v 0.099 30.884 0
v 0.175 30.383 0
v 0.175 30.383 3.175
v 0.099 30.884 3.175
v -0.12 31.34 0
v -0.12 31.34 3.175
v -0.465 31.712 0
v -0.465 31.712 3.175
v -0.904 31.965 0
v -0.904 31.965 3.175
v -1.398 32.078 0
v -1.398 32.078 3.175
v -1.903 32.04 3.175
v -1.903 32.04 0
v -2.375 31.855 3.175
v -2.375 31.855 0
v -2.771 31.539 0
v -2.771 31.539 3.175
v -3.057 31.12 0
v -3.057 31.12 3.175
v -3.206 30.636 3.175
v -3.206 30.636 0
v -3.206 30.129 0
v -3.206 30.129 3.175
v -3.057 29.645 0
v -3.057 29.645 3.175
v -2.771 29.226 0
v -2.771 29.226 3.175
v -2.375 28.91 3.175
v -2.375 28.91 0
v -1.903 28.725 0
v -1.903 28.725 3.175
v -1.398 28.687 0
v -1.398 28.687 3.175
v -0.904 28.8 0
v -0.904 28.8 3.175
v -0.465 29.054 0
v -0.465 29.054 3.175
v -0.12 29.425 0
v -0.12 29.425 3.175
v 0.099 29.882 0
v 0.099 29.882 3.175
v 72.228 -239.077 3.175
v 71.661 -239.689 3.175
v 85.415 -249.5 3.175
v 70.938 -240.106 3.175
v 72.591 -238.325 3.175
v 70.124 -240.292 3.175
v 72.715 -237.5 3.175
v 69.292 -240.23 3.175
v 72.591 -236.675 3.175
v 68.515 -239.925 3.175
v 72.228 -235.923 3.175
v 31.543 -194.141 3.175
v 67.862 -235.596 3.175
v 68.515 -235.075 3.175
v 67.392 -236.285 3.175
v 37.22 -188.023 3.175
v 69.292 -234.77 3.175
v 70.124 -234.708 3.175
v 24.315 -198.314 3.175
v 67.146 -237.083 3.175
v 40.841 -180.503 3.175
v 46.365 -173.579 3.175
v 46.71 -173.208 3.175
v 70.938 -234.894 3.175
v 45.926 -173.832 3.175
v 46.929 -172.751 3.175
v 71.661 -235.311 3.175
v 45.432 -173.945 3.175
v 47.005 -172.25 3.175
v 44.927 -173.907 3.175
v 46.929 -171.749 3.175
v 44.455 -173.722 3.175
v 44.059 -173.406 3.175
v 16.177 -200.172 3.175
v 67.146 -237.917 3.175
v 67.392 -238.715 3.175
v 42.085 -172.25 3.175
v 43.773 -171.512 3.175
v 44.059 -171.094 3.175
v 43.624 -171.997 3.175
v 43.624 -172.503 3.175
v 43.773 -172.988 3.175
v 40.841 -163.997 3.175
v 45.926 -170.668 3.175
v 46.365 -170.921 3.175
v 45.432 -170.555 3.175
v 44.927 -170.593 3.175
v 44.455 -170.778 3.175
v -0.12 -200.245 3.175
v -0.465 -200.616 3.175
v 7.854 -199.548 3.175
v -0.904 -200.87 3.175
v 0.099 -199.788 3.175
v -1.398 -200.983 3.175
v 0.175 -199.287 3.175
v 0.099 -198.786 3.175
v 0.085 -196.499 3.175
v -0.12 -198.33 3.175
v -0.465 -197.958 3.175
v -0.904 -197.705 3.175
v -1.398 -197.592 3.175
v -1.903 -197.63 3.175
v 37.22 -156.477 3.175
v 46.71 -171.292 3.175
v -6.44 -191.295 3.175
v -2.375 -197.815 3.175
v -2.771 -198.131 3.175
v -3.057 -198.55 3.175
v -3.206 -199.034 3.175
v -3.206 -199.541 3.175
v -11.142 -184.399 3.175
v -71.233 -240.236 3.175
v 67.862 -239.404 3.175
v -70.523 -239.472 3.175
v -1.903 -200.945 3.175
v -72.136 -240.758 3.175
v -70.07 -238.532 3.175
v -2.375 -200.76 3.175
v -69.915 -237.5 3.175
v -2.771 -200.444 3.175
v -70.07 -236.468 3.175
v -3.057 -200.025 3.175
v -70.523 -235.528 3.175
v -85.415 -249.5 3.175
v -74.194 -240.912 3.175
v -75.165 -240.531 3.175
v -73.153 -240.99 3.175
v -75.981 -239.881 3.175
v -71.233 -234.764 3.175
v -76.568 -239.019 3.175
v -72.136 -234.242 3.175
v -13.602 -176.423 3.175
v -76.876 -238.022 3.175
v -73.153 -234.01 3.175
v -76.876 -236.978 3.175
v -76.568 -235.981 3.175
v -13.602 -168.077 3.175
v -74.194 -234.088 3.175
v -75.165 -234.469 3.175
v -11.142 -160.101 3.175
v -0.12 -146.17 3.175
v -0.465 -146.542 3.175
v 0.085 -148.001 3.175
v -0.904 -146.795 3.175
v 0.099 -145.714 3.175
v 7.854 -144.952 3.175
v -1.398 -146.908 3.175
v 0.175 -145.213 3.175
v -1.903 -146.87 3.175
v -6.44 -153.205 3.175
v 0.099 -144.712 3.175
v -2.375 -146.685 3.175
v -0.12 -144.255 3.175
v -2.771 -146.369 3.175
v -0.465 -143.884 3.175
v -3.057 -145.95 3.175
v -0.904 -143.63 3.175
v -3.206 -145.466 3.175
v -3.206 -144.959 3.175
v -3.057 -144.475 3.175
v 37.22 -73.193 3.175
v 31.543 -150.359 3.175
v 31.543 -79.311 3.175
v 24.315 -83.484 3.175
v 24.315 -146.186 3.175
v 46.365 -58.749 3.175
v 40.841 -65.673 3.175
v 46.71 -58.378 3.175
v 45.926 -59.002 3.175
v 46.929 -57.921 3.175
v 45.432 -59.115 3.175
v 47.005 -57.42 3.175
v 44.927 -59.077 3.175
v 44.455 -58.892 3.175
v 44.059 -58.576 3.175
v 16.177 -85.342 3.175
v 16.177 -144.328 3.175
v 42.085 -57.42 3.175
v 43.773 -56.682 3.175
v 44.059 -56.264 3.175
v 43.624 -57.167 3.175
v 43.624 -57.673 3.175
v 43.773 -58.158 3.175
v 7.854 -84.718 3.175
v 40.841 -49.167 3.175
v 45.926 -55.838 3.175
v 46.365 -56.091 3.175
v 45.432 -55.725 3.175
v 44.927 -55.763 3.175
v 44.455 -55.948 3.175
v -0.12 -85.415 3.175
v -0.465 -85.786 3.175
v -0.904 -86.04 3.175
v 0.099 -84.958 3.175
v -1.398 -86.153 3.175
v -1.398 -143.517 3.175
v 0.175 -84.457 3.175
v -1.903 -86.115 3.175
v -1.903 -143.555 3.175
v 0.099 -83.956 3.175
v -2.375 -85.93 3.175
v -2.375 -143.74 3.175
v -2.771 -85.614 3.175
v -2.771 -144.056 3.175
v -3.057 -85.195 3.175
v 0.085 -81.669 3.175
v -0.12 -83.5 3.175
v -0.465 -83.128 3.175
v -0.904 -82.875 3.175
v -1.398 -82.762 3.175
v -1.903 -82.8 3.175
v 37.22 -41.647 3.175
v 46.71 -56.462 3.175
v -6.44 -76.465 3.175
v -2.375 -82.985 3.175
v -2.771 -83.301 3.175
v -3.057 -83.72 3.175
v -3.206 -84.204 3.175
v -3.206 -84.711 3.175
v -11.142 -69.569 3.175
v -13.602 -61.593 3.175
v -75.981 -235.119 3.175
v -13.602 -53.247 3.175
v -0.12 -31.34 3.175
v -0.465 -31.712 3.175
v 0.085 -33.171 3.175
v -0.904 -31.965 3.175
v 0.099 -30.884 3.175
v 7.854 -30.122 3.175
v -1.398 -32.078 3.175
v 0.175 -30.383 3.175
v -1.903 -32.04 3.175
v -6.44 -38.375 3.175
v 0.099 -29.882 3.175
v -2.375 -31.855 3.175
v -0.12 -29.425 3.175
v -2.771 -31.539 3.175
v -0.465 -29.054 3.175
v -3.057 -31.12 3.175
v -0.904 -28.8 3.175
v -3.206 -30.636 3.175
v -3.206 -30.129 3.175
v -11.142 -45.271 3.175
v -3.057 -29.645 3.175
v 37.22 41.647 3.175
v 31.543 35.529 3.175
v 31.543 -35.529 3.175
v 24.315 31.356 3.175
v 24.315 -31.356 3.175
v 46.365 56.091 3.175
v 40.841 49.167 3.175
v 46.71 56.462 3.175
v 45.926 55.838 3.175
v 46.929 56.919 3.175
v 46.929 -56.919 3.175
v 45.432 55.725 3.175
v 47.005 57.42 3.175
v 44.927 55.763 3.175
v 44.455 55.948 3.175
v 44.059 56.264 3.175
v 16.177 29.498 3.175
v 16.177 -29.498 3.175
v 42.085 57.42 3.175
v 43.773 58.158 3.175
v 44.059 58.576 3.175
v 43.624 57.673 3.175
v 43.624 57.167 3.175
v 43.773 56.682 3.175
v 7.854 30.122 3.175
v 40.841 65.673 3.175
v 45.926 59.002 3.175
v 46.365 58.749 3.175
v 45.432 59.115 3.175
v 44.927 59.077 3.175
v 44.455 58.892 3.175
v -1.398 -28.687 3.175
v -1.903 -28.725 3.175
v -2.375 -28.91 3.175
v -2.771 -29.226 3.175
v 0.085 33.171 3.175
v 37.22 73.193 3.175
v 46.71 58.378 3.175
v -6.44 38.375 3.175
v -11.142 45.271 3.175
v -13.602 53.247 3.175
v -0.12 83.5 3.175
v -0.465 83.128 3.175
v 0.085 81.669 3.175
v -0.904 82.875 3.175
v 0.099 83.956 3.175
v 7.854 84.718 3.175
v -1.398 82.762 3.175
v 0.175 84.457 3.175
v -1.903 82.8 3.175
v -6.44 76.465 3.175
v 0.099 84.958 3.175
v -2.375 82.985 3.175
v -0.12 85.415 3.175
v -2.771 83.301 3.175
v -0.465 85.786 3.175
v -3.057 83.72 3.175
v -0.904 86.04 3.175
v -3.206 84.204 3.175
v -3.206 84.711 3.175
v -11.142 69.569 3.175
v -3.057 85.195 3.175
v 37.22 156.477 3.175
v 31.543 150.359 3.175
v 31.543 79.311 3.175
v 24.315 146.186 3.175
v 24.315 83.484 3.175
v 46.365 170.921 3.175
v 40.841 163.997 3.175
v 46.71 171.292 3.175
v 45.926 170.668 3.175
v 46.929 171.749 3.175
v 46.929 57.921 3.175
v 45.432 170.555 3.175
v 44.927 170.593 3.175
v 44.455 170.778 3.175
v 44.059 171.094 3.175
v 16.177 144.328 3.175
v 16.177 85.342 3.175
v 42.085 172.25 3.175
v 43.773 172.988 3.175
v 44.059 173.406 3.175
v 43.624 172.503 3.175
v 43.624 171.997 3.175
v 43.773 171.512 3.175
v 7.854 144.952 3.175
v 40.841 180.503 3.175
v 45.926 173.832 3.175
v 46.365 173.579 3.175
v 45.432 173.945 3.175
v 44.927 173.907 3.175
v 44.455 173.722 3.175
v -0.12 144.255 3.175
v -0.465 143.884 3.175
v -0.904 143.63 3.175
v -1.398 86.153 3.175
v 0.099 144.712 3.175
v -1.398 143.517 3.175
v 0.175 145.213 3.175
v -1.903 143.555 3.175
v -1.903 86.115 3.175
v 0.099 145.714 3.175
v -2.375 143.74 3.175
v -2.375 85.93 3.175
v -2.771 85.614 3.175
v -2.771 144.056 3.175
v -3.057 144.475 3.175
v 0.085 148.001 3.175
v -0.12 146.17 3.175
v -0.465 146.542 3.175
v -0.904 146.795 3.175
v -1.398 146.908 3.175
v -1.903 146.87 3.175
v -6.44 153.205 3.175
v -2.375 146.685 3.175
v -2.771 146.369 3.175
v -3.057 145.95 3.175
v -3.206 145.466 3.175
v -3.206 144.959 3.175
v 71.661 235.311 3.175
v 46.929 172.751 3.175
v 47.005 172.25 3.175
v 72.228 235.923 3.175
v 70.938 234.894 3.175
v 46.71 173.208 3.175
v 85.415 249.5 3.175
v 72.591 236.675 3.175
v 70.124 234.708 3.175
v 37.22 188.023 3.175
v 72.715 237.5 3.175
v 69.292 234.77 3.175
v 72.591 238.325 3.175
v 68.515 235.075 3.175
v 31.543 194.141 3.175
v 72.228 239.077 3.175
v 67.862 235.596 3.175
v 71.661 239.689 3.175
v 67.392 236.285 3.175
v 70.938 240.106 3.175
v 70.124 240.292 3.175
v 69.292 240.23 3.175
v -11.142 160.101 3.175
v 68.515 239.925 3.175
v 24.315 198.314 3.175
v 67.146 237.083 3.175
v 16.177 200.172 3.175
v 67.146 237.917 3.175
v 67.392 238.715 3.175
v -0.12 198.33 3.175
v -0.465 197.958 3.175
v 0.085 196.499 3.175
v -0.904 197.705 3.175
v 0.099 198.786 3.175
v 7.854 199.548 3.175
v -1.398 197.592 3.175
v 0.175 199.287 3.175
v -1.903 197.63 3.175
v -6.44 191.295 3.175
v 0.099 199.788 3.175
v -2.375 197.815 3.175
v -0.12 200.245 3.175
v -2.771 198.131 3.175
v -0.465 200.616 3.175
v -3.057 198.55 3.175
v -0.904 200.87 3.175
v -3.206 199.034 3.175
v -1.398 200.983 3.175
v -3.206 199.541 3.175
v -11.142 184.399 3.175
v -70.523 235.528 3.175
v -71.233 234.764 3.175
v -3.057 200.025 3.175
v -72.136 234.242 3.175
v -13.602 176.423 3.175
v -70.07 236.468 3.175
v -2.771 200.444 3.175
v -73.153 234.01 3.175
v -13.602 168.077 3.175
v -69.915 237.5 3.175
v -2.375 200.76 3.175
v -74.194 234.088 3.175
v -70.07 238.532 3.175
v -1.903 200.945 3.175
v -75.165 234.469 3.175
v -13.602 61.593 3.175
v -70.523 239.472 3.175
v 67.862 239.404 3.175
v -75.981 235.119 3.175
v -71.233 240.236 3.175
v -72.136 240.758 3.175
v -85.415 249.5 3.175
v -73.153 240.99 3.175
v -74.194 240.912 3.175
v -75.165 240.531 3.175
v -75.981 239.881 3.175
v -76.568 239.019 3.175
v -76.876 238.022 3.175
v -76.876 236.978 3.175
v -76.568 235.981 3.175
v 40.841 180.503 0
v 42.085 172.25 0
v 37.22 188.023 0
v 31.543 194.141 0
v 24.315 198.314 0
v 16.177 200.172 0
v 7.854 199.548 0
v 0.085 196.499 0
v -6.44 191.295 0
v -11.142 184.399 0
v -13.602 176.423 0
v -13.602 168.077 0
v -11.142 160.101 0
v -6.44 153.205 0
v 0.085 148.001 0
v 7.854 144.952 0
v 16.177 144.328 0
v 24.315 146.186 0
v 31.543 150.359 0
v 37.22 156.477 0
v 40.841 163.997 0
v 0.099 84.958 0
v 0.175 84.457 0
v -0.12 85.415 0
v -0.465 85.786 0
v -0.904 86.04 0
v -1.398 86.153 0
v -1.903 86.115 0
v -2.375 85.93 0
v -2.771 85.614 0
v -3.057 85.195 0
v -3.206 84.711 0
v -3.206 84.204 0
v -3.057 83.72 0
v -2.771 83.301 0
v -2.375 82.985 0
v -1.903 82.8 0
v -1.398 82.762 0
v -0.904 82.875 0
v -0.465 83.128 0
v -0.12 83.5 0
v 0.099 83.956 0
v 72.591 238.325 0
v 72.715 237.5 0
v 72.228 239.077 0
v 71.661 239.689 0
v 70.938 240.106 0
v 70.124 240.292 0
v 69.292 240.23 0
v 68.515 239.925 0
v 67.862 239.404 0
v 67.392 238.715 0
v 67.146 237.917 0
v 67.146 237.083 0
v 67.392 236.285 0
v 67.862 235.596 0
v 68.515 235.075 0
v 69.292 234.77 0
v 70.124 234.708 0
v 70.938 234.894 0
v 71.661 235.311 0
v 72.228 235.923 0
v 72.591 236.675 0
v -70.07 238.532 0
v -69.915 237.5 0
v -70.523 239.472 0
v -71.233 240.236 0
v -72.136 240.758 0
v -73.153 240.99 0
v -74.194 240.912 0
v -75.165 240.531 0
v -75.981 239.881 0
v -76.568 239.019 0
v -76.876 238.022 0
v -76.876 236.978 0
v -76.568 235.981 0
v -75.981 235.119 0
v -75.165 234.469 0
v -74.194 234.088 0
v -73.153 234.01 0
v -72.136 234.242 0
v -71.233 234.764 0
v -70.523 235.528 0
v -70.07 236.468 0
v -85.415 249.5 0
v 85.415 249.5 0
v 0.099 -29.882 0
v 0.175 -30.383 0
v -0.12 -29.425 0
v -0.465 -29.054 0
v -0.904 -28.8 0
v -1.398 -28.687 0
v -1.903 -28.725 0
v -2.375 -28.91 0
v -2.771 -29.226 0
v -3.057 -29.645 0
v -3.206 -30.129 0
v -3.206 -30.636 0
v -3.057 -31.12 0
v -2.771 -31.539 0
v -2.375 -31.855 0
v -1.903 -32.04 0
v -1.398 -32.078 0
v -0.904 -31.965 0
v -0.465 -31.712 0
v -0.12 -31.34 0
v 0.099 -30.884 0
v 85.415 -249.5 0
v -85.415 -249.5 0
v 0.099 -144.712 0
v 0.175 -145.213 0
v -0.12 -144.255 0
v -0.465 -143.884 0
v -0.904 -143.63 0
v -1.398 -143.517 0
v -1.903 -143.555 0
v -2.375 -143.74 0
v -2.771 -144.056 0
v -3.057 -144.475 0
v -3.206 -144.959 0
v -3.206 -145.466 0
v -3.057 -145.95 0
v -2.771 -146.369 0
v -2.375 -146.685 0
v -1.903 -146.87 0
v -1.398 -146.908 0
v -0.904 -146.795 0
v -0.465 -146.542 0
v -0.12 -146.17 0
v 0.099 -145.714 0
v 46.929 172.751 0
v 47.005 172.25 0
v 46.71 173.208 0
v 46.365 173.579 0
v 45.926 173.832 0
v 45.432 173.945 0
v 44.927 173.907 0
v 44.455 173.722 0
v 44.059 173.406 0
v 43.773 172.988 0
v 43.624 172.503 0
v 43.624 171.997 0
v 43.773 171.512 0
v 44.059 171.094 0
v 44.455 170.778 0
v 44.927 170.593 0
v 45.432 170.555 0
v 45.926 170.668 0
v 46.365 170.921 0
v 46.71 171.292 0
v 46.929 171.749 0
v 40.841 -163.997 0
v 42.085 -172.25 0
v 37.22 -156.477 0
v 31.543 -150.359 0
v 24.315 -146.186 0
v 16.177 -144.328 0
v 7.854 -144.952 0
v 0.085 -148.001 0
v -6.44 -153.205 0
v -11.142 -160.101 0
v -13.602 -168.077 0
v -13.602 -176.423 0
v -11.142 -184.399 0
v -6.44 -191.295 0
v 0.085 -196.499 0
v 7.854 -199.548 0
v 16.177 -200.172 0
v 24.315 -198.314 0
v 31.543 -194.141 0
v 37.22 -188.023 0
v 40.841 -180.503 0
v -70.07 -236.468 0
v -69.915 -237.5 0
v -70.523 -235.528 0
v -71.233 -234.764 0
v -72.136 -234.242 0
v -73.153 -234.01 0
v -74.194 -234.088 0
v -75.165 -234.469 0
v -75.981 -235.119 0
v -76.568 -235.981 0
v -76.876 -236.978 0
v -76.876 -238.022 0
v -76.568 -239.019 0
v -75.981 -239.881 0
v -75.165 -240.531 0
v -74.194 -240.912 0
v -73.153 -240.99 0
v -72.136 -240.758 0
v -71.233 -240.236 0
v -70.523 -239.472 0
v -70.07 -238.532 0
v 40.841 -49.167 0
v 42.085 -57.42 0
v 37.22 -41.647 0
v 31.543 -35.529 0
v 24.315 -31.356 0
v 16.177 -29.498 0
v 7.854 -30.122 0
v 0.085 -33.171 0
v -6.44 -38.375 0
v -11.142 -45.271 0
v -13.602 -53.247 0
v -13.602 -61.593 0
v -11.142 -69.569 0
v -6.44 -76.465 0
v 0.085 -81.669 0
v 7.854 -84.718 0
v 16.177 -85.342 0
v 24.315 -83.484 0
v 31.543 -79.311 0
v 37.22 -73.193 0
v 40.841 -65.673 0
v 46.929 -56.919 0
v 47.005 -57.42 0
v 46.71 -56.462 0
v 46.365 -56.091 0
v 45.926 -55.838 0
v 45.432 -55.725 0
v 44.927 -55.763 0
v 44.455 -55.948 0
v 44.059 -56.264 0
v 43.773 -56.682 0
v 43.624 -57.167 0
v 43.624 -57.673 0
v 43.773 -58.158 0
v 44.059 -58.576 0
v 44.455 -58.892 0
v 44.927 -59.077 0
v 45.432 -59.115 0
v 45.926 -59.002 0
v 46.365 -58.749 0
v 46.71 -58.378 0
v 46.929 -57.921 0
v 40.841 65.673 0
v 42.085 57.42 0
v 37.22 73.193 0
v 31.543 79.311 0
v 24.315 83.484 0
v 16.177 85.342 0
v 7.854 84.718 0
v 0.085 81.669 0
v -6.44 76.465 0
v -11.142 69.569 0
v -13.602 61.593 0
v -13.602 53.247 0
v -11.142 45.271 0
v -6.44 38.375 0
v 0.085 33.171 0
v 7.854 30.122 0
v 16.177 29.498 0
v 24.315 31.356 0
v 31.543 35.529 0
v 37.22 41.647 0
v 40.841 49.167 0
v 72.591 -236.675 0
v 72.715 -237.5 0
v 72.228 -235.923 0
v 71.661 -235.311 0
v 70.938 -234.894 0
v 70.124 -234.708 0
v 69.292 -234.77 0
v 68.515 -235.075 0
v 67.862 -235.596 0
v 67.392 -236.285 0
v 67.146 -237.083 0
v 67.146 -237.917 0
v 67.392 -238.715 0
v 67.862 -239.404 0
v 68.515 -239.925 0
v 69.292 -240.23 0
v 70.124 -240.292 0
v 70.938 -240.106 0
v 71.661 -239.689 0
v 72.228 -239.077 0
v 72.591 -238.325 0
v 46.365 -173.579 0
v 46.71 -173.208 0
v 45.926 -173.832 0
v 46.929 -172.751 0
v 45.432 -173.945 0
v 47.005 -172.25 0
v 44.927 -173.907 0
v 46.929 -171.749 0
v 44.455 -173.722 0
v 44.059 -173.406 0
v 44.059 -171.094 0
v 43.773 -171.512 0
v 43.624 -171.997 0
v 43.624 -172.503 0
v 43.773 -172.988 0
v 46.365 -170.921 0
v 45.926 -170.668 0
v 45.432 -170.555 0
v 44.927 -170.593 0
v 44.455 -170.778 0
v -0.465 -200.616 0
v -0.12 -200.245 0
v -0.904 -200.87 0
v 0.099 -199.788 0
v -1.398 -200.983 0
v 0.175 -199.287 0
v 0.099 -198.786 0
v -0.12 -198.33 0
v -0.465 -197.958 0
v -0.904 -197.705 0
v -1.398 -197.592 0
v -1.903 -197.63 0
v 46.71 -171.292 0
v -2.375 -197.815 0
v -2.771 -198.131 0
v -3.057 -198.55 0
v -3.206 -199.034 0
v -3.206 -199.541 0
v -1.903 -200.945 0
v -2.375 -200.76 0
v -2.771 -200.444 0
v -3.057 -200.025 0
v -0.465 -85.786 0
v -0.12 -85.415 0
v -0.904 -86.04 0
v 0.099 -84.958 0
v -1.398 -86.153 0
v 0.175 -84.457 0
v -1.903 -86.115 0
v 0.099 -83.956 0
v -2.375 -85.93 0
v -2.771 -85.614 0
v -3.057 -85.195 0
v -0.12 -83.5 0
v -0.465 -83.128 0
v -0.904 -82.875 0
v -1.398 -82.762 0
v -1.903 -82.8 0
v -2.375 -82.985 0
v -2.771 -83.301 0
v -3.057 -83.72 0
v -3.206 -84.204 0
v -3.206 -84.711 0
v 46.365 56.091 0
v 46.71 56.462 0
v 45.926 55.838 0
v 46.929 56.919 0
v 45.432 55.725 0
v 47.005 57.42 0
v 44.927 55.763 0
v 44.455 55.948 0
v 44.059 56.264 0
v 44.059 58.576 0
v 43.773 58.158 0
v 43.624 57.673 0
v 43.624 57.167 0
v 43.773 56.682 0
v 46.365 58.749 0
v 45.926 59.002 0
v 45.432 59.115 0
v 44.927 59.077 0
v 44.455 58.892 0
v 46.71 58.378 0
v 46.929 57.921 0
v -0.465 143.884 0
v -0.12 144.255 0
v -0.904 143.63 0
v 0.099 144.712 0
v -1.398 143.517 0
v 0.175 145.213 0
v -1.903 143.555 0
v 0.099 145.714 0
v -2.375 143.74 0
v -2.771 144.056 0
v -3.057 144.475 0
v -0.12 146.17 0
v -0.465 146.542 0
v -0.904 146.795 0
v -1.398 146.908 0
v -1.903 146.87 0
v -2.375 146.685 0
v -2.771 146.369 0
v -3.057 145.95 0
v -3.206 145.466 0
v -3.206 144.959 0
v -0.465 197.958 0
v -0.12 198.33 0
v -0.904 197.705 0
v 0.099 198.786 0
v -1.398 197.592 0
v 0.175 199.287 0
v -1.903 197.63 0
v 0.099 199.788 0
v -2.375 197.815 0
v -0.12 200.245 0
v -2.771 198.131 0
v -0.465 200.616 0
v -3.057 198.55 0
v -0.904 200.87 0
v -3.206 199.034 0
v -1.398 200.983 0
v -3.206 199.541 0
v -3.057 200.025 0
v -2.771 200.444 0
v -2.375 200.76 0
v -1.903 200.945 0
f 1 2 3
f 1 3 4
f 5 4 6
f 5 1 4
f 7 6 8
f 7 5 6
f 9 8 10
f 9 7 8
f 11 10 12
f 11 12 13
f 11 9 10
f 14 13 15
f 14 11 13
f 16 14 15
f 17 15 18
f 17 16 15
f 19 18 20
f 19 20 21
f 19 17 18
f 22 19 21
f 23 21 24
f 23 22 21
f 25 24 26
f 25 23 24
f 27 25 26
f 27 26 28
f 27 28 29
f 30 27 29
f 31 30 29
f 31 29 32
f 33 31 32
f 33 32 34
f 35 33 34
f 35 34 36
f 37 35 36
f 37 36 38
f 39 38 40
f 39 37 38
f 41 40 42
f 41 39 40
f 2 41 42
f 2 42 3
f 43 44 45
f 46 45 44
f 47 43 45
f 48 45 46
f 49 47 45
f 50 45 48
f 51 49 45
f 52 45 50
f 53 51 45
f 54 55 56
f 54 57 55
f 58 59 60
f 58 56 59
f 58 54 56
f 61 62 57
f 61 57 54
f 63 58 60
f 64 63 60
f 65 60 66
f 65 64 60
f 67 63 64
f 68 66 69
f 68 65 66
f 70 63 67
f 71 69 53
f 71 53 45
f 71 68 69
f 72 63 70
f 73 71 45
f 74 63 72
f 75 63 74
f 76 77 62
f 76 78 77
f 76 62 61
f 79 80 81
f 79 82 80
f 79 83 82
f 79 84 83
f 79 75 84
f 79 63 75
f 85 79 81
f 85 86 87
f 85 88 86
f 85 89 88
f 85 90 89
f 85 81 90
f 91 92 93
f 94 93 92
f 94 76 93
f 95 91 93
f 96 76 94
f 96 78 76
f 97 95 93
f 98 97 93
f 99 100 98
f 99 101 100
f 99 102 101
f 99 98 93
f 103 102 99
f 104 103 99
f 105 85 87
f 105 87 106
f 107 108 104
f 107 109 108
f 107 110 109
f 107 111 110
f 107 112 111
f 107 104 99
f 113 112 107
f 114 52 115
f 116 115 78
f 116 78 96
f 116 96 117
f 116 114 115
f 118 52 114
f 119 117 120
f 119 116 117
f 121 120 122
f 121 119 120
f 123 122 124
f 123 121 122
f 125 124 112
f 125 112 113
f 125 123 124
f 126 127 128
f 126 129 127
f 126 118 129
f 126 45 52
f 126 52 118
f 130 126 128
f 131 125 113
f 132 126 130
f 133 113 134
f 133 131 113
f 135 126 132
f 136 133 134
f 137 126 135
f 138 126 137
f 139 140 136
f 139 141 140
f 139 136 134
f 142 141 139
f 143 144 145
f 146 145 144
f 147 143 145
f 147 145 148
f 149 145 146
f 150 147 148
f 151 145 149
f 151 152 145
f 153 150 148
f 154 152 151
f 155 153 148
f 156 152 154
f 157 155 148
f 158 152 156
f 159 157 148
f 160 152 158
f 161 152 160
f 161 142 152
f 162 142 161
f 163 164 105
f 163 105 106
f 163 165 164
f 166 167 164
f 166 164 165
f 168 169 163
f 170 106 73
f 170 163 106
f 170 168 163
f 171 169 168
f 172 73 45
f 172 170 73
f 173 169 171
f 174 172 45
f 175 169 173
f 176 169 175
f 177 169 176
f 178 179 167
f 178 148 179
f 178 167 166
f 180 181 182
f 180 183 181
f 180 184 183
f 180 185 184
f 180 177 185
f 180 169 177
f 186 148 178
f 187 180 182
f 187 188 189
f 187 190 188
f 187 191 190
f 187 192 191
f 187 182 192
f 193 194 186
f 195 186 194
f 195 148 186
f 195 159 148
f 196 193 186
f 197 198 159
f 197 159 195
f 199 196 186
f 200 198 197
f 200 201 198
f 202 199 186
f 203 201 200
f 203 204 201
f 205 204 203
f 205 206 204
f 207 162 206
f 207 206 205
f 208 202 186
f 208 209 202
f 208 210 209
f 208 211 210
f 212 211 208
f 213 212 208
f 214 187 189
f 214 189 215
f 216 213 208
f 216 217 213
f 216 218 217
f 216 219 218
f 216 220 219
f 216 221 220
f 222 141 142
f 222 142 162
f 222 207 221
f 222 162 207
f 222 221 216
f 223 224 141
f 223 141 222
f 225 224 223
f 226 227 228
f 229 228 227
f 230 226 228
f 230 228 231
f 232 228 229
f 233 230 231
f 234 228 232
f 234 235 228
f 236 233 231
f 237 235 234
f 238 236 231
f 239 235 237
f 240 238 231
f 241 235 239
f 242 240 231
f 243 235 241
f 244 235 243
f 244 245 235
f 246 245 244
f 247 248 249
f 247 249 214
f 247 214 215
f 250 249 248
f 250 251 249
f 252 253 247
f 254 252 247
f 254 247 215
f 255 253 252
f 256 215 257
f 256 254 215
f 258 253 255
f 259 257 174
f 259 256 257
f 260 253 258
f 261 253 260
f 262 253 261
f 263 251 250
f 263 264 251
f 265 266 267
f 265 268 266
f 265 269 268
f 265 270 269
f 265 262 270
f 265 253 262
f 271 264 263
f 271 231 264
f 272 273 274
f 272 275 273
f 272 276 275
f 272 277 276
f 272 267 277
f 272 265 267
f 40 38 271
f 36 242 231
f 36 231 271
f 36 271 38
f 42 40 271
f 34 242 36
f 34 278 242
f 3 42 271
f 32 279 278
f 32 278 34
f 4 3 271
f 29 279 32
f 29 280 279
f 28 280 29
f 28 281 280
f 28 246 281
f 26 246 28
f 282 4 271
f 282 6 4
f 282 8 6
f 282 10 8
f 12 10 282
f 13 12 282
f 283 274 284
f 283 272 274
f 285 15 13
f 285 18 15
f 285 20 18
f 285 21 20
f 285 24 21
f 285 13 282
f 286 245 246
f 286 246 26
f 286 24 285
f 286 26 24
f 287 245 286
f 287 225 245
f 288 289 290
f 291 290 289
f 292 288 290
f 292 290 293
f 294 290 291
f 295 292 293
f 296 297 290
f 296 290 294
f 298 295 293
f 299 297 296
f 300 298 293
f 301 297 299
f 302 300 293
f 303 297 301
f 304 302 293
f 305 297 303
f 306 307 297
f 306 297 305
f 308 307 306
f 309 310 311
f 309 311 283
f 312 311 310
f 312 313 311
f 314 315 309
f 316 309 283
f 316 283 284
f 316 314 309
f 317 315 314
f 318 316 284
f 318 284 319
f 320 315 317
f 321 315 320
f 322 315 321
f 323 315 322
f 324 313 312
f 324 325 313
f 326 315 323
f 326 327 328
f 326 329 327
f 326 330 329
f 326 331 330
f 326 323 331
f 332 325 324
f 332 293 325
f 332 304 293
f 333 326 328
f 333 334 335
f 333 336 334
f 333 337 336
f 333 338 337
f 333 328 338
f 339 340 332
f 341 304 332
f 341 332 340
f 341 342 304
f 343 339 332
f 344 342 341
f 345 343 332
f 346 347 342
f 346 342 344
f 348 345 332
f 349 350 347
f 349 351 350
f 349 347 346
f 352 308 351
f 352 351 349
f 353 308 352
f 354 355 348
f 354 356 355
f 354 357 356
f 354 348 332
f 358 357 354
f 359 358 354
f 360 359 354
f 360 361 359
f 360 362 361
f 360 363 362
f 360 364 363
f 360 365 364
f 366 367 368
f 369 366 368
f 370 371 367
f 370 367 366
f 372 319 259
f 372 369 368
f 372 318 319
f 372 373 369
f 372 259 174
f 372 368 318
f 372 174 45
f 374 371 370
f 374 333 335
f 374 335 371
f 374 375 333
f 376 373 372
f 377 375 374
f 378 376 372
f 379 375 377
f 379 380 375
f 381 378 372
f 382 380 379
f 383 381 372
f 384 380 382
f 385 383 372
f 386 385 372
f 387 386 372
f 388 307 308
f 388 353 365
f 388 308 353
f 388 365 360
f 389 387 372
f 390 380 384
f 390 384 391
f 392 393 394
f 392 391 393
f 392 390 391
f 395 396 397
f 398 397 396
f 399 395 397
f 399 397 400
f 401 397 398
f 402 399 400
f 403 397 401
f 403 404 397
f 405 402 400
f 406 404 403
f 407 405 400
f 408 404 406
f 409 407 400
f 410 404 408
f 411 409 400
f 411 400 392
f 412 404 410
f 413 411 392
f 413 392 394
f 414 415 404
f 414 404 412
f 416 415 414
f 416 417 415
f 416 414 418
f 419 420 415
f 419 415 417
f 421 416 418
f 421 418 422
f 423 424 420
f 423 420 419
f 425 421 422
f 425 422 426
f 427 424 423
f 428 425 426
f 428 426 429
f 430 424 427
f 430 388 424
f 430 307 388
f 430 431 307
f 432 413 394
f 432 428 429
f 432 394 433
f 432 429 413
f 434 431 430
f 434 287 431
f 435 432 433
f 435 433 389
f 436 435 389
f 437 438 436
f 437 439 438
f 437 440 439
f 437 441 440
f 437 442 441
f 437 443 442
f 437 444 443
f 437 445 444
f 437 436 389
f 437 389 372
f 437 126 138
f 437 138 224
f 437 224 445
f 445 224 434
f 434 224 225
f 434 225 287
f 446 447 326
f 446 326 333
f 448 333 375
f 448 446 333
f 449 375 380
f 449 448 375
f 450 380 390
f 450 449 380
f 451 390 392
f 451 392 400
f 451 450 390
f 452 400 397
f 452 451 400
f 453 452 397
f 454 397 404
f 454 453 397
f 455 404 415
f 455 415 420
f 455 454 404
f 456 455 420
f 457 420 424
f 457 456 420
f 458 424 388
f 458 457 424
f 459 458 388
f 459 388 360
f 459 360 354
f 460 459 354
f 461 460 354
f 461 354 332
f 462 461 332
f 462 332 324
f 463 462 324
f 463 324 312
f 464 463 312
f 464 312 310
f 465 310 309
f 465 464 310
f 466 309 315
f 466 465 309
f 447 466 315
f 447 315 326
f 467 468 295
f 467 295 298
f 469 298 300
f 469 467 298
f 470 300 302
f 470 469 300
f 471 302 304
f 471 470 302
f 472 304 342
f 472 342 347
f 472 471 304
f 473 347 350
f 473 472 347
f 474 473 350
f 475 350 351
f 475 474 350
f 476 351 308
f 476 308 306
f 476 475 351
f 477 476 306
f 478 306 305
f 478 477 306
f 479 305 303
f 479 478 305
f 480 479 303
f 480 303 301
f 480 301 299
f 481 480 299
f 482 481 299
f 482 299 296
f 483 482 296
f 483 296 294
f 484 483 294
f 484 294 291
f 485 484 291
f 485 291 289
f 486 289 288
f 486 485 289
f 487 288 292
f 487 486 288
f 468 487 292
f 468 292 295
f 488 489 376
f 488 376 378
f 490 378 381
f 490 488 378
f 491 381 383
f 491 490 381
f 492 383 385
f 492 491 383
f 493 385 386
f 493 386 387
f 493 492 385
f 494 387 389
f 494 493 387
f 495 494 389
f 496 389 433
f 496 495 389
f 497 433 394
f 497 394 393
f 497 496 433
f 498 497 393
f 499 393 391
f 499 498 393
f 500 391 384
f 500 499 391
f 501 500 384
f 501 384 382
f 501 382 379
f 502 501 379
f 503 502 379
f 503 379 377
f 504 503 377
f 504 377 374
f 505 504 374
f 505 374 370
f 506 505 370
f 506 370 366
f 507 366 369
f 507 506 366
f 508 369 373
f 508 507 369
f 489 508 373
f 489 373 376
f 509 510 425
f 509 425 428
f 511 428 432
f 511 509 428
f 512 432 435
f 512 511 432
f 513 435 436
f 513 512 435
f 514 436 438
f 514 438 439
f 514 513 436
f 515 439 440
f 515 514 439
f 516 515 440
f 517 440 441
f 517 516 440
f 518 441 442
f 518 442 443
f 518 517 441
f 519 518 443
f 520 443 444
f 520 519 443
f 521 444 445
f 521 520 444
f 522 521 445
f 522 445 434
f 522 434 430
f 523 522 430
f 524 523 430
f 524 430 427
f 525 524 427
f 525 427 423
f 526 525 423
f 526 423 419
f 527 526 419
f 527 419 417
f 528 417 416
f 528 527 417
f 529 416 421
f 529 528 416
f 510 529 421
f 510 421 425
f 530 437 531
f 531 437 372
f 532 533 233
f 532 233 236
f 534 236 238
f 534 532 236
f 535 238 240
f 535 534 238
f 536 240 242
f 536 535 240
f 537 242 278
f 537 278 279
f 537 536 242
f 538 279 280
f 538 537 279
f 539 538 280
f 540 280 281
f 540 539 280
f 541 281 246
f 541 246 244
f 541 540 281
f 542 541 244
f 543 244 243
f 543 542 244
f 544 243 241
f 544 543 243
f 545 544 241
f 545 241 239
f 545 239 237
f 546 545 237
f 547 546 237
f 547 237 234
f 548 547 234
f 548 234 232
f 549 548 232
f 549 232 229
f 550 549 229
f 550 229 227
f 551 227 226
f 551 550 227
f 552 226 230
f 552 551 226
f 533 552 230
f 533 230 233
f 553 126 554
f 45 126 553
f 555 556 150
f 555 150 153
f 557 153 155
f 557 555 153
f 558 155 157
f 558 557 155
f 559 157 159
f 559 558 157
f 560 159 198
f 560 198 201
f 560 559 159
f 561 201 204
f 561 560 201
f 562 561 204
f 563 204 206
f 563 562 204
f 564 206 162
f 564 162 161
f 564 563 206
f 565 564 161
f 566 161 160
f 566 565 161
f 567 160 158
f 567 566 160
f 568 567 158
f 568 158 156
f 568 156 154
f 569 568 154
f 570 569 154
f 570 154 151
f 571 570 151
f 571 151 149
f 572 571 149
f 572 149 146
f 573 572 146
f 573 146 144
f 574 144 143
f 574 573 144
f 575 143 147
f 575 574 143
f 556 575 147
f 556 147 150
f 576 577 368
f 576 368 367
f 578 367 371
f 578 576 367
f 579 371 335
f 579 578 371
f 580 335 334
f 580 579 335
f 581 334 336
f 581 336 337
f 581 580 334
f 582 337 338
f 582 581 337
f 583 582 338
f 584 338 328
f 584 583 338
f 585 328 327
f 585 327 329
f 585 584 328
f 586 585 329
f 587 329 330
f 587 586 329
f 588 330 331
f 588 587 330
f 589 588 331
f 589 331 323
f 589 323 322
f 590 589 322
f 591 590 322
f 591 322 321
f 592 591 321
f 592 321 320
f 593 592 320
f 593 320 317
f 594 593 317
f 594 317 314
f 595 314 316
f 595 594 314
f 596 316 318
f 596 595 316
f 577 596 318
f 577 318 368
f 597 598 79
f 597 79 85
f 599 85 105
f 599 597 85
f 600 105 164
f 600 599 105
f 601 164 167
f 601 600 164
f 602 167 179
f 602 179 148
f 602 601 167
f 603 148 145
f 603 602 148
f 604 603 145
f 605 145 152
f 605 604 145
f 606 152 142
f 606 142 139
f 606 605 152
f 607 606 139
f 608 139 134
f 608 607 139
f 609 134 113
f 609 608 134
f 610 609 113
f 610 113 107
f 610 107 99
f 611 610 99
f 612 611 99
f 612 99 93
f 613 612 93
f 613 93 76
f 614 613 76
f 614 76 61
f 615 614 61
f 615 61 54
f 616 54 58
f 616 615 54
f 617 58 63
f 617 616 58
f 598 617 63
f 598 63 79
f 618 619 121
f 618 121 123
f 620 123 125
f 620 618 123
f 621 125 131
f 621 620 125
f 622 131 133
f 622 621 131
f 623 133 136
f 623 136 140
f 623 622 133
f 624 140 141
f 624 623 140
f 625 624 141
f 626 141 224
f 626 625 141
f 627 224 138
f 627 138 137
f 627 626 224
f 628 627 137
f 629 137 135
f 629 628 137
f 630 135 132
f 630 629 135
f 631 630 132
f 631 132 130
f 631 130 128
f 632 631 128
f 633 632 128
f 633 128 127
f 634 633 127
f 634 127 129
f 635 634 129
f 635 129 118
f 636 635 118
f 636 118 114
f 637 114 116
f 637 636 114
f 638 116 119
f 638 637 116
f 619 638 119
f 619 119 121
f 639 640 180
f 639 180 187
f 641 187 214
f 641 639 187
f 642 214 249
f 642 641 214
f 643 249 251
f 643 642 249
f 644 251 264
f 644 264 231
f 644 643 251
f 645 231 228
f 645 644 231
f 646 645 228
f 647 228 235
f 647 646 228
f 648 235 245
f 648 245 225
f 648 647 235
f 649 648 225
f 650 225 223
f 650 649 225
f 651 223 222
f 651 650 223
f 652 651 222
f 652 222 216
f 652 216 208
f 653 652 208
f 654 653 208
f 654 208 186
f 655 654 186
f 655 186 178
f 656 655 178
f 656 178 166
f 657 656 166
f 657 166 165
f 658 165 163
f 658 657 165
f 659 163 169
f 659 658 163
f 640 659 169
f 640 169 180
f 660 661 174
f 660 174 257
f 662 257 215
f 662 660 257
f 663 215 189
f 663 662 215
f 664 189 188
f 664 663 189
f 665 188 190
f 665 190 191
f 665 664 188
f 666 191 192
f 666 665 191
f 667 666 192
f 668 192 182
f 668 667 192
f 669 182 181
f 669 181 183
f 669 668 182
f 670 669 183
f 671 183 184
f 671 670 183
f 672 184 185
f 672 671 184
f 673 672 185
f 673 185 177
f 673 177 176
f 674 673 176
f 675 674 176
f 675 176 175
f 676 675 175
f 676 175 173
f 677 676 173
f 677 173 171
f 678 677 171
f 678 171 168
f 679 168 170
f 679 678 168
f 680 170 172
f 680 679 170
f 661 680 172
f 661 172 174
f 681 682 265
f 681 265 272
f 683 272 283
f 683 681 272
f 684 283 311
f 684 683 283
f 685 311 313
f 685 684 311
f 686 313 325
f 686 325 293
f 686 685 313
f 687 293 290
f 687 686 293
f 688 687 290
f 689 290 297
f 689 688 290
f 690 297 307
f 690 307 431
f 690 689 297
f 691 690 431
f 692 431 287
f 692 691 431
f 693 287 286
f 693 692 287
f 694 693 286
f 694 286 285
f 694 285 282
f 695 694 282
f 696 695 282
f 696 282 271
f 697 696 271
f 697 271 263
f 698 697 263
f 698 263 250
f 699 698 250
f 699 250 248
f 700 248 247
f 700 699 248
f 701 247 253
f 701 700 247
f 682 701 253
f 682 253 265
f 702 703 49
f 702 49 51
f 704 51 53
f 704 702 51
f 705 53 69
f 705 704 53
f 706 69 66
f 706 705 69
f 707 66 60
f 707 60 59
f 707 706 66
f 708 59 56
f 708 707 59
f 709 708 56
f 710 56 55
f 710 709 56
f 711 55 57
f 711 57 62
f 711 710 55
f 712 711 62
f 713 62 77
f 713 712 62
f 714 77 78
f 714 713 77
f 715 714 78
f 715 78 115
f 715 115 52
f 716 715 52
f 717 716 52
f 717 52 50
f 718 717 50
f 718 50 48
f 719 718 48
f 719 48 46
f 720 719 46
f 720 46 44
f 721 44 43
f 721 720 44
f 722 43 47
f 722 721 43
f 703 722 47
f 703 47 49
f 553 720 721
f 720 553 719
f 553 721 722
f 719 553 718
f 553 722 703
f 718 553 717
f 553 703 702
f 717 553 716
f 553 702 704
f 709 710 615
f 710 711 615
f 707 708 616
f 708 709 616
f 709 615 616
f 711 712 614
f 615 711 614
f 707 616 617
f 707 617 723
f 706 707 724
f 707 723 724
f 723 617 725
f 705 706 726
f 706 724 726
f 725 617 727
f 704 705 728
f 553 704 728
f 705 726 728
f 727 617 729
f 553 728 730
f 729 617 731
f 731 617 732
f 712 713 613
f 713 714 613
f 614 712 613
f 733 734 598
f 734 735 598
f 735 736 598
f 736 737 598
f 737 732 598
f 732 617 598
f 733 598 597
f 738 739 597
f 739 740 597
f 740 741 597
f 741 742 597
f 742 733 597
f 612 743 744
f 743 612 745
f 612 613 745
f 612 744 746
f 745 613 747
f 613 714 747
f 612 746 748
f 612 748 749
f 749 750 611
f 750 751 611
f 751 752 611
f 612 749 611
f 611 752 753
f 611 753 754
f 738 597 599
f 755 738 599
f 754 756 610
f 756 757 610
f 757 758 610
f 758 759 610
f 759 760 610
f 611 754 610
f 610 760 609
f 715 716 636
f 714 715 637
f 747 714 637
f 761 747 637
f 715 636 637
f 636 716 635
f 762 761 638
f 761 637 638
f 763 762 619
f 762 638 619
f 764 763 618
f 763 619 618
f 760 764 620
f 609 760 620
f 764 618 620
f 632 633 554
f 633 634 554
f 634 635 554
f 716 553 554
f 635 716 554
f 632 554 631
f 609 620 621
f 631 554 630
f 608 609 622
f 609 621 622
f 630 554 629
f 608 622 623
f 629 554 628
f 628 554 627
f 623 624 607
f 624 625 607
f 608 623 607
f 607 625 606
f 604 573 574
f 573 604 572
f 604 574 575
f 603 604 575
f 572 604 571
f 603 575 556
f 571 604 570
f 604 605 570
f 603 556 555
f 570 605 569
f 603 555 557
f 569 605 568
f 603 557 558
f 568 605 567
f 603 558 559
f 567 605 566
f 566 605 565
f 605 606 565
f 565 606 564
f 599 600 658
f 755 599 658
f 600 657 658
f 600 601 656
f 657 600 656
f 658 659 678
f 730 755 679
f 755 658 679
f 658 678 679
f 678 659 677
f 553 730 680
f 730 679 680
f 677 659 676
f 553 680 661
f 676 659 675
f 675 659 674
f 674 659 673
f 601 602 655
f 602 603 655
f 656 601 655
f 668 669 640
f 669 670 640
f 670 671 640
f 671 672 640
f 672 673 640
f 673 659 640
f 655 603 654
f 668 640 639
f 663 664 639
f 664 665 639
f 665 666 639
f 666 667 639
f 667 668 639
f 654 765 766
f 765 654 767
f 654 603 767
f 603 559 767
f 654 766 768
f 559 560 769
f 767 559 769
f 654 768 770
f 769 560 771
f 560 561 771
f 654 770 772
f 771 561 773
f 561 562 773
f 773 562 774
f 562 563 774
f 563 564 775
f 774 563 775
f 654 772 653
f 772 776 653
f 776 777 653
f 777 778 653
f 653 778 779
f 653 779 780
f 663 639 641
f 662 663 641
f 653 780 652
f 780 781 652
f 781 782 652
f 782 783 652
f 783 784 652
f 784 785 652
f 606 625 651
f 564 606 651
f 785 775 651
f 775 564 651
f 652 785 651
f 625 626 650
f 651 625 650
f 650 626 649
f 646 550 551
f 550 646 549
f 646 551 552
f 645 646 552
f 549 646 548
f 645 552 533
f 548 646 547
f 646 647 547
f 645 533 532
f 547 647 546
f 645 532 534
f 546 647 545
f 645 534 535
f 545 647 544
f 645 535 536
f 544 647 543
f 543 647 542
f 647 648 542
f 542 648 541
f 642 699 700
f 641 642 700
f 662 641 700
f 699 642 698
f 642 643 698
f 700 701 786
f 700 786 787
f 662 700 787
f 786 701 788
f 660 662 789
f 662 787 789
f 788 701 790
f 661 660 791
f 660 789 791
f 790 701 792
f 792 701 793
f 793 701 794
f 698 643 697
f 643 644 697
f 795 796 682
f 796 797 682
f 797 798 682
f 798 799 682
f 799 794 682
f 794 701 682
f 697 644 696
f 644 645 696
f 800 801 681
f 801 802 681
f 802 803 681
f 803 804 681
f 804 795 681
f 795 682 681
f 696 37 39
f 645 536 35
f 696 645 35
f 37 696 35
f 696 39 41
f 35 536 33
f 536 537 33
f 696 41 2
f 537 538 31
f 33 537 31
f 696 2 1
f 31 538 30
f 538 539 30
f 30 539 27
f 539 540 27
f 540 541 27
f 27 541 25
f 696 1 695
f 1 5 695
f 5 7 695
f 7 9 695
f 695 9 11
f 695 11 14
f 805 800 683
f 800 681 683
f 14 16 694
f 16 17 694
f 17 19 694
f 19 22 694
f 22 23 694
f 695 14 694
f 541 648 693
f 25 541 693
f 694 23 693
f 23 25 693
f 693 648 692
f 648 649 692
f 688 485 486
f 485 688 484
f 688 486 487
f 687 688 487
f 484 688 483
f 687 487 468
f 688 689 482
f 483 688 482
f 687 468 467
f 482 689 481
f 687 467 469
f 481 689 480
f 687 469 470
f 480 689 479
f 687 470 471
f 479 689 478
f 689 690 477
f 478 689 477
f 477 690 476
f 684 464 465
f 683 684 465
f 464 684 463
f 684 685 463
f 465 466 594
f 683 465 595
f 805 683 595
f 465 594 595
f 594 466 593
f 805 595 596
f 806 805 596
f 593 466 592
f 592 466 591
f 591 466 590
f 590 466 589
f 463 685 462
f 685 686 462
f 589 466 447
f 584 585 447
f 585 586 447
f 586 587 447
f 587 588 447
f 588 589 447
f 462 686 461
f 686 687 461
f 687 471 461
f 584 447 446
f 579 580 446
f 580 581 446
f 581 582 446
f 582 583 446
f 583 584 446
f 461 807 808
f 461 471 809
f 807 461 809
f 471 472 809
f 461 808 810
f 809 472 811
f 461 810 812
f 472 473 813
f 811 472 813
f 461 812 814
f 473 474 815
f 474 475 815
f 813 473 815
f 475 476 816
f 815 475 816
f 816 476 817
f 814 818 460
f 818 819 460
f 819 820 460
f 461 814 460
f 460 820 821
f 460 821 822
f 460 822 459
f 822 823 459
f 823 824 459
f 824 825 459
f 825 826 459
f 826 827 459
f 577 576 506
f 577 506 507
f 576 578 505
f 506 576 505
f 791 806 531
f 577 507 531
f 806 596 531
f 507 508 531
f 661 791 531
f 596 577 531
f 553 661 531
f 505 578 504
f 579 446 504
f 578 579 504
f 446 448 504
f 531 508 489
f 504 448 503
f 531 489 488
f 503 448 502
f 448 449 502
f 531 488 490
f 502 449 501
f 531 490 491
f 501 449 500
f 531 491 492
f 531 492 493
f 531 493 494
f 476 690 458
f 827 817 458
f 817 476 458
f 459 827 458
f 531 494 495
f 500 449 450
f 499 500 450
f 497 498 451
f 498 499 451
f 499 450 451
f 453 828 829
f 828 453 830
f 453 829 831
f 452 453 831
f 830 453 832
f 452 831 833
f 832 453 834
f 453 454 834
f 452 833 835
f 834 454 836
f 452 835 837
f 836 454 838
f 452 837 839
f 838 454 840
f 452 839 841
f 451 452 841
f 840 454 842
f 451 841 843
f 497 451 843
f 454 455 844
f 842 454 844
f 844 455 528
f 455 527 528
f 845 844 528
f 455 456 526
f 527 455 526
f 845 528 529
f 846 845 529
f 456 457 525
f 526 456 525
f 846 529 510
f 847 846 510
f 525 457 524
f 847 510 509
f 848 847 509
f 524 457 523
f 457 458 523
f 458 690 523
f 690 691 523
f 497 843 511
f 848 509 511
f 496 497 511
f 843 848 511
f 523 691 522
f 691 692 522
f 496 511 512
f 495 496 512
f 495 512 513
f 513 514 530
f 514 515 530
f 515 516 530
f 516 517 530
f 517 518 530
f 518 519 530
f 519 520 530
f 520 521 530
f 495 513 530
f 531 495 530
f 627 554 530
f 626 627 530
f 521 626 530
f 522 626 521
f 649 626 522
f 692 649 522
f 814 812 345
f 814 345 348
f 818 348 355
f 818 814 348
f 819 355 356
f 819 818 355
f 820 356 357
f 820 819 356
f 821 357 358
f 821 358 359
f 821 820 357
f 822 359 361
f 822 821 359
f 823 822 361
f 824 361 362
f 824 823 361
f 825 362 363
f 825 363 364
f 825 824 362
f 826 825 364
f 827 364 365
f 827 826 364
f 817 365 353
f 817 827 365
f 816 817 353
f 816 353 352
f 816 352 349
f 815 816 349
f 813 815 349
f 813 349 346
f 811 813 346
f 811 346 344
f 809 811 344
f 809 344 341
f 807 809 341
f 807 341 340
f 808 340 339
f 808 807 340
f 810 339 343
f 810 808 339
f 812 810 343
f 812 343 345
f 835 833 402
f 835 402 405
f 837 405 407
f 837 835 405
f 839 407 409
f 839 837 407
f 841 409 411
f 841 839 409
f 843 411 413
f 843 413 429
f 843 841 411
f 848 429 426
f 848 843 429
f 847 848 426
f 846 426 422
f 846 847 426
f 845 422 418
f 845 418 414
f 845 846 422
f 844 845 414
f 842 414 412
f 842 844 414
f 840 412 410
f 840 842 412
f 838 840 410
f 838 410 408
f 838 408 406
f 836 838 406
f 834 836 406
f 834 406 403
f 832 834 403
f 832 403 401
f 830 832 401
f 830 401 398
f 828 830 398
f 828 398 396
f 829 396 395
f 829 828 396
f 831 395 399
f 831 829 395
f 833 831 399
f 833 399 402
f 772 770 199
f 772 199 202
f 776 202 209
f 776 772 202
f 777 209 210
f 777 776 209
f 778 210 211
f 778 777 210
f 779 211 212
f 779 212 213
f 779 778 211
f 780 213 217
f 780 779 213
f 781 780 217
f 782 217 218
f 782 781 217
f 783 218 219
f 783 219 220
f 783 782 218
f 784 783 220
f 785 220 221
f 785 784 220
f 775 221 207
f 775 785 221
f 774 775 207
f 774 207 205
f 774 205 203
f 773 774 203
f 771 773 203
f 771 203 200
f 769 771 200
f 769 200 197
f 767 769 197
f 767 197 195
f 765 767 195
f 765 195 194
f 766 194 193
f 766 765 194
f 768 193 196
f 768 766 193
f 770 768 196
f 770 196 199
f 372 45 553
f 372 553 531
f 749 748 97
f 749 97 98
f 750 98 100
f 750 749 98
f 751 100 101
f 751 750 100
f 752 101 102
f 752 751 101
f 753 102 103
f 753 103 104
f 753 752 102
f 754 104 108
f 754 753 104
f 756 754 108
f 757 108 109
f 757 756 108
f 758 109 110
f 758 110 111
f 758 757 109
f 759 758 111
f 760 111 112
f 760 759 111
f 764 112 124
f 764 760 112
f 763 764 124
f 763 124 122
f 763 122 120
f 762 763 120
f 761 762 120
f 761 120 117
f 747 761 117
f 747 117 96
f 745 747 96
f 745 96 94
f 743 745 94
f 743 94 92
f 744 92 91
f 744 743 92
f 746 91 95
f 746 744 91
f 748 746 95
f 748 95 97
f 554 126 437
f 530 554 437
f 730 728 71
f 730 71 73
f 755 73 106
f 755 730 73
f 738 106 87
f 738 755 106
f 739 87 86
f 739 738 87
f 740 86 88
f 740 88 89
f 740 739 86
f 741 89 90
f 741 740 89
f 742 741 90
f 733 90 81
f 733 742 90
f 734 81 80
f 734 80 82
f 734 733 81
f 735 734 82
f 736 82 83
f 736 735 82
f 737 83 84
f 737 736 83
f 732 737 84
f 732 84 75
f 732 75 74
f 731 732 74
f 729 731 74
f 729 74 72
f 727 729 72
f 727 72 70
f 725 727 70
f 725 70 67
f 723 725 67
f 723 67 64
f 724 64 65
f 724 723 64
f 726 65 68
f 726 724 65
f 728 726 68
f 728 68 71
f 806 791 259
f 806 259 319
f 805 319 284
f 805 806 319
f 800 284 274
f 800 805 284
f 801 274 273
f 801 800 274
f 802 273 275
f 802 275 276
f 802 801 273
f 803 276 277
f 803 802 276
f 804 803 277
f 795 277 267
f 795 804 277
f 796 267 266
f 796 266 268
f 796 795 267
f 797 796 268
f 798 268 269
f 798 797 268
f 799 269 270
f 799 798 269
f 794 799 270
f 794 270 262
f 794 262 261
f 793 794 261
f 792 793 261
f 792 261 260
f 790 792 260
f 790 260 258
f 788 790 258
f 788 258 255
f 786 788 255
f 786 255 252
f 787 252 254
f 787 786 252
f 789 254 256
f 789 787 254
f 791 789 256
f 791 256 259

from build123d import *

# Parameters (mm, degrees)
SKETCH1_W           = 500
SKETCH1_H           = 171.83
SKETCH1_R           = 1.7
SKETCH1_R_2         = 28
SKETCH1_R_3         = 2.8
SKETCH1_R_4         = 3.5
BOSS_EXTRUDE1_DEPTH = 3.175
SKETCH2_W           = 171.83
SKETCH2_H           = 500
SKETCH2_W_2         = 170.83
SKETCH2_H_2         = 499
CUT_EXTRUDE1_DEPTH  = 3.175


with BuildPart() as part:
    # Sketch1 → Boss-Extrude1 (new body)
    with BuildSketch(Plane(origin=(0, 0, 0), x_dir=(0, 1, 0), z_dir=(0, 0, 1))):
        Rectangle(SKETCH1_W, SKETCH1_H)
        with Locations(Location((57.42, -45.305, 0), (0, 0, 270))):
            Circle(SKETCH1_R, mode=Mode.SUBTRACT)
        with Locations(Location((30.382686894, 1.525, 0), (0, 0, 270))):
            Circle(SKETCH1_R, mode=Mode.SUBTRACT)
        with Locations(Location((84.457313106, 1.525, 0), (0, 0, 270))):
            Circle(SKETCH1_R, mode=Mode.SUBTRACT)
        with Locations(Location((145.212686894, 1.525, 0), (0, 0, 270))):
            Circle(SKETCH1_R, mode=Mode.SUBTRACT)
        with Locations(Location((-57.42, -45.305, 0), (0, 0, 270))):
            Circle(SKETCH1_R, mode=Mode.SUBTRACT)
        with Locations(Location((-30.382686894, 1.525, 0), (0, 0, 270))):
            Circle(SKETCH1_R, mode=Mode.SUBTRACT)
        with Locations(Location((-145.212686894, 1.525, 0), (0, 0, 270))):
            Circle(SKETCH1_R, mode=Mode.SUBTRACT)
        with Locations(Location((-199.287313106, 1.525, 0), (0, 0, 270))):
            Circle(SKETCH1_R, mode=Mode.SUBTRACT)
        with Locations(Location((-172.25, -45.305, 0), (0, 0, 270))):
            Circle(SKETCH1_R, mode=Mode.SUBTRACT)
        with Locations(Location((172.25, -14.085, 0), (0, 0, 270))):
            Circle(SKETCH1_R_2, mode=Mode.SUBTRACT)
        with Locations(Location((-57.42, -14.085, 0), (0, 0, 270))):
            Circle(SKETCH1_R_2, mode=Mode.SUBTRACT)
        with Locations(Location((-172.25, -14.085, 0), (0, 0, 270))):
            Circle(SKETCH1_R_2, mode=Mode.SUBTRACT)
        with Locations(Location((237.5, -69.915, 0), (0, 0, 270))):
            Circle(SKETCH1_R_3, mode=Mode.SUBTRACT)
        with Locations(Location((-237.5, -69.915, 0), (0, 0, 270))):
            Circle(SKETCH1_R_3, mode=Mode.SUBTRACT)
        with Locations(Location((237.5, 73.415, 0), (0, 0, 270))):
            Circle(SKETCH1_R_4, mode=Mode.SUBTRACT)
        with Locations(Location((-237.5, 73.415, 0), (0, 0, 270))):
            Circle(SKETCH1_R_4, mode=Mode.SUBTRACT)
        with Locations(Location((57.42, -14.085, 0), (0, 0, 270))):
            Circle(SKETCH1_R_2, mode=Mode.SUBTRACT)
        with Locations(Location((-84.457313106, 1.525, 0), (0, 0, 270))):
            Circle(SKETCH1_R, mode=Mode.SUBTRACT)
        with Locations(Location((199.287313106, 1.525, 0), (0, 0, 270))):
            Circle(SKETCH1_R, mode=Mode.SUBTRACT)
        with Locations(Location((172.25, -45.305, 0), (0, 0, 270))):
            Circle(SKETCH1_R, mode=Mode.SUBTRACT)
    extrude(amount=BOSS_EXTRUDE1_DEPTH)

    # Sketch2 → Cut-Extrude1 (cut)
    with BuildSketch(Plane.XY.offset(3.175)):
        Rectangle(SKETCH2_W, SKETCH2_H)
        Rectangle(SKETCH2_W_2, SKETCH2_H_2, mode=Mode.SUBTRACT)
    extrude(amount=-CUT_EXTRUDE1_DEPTH, mode=Mode.SUBTRACT)


solid = part.part
